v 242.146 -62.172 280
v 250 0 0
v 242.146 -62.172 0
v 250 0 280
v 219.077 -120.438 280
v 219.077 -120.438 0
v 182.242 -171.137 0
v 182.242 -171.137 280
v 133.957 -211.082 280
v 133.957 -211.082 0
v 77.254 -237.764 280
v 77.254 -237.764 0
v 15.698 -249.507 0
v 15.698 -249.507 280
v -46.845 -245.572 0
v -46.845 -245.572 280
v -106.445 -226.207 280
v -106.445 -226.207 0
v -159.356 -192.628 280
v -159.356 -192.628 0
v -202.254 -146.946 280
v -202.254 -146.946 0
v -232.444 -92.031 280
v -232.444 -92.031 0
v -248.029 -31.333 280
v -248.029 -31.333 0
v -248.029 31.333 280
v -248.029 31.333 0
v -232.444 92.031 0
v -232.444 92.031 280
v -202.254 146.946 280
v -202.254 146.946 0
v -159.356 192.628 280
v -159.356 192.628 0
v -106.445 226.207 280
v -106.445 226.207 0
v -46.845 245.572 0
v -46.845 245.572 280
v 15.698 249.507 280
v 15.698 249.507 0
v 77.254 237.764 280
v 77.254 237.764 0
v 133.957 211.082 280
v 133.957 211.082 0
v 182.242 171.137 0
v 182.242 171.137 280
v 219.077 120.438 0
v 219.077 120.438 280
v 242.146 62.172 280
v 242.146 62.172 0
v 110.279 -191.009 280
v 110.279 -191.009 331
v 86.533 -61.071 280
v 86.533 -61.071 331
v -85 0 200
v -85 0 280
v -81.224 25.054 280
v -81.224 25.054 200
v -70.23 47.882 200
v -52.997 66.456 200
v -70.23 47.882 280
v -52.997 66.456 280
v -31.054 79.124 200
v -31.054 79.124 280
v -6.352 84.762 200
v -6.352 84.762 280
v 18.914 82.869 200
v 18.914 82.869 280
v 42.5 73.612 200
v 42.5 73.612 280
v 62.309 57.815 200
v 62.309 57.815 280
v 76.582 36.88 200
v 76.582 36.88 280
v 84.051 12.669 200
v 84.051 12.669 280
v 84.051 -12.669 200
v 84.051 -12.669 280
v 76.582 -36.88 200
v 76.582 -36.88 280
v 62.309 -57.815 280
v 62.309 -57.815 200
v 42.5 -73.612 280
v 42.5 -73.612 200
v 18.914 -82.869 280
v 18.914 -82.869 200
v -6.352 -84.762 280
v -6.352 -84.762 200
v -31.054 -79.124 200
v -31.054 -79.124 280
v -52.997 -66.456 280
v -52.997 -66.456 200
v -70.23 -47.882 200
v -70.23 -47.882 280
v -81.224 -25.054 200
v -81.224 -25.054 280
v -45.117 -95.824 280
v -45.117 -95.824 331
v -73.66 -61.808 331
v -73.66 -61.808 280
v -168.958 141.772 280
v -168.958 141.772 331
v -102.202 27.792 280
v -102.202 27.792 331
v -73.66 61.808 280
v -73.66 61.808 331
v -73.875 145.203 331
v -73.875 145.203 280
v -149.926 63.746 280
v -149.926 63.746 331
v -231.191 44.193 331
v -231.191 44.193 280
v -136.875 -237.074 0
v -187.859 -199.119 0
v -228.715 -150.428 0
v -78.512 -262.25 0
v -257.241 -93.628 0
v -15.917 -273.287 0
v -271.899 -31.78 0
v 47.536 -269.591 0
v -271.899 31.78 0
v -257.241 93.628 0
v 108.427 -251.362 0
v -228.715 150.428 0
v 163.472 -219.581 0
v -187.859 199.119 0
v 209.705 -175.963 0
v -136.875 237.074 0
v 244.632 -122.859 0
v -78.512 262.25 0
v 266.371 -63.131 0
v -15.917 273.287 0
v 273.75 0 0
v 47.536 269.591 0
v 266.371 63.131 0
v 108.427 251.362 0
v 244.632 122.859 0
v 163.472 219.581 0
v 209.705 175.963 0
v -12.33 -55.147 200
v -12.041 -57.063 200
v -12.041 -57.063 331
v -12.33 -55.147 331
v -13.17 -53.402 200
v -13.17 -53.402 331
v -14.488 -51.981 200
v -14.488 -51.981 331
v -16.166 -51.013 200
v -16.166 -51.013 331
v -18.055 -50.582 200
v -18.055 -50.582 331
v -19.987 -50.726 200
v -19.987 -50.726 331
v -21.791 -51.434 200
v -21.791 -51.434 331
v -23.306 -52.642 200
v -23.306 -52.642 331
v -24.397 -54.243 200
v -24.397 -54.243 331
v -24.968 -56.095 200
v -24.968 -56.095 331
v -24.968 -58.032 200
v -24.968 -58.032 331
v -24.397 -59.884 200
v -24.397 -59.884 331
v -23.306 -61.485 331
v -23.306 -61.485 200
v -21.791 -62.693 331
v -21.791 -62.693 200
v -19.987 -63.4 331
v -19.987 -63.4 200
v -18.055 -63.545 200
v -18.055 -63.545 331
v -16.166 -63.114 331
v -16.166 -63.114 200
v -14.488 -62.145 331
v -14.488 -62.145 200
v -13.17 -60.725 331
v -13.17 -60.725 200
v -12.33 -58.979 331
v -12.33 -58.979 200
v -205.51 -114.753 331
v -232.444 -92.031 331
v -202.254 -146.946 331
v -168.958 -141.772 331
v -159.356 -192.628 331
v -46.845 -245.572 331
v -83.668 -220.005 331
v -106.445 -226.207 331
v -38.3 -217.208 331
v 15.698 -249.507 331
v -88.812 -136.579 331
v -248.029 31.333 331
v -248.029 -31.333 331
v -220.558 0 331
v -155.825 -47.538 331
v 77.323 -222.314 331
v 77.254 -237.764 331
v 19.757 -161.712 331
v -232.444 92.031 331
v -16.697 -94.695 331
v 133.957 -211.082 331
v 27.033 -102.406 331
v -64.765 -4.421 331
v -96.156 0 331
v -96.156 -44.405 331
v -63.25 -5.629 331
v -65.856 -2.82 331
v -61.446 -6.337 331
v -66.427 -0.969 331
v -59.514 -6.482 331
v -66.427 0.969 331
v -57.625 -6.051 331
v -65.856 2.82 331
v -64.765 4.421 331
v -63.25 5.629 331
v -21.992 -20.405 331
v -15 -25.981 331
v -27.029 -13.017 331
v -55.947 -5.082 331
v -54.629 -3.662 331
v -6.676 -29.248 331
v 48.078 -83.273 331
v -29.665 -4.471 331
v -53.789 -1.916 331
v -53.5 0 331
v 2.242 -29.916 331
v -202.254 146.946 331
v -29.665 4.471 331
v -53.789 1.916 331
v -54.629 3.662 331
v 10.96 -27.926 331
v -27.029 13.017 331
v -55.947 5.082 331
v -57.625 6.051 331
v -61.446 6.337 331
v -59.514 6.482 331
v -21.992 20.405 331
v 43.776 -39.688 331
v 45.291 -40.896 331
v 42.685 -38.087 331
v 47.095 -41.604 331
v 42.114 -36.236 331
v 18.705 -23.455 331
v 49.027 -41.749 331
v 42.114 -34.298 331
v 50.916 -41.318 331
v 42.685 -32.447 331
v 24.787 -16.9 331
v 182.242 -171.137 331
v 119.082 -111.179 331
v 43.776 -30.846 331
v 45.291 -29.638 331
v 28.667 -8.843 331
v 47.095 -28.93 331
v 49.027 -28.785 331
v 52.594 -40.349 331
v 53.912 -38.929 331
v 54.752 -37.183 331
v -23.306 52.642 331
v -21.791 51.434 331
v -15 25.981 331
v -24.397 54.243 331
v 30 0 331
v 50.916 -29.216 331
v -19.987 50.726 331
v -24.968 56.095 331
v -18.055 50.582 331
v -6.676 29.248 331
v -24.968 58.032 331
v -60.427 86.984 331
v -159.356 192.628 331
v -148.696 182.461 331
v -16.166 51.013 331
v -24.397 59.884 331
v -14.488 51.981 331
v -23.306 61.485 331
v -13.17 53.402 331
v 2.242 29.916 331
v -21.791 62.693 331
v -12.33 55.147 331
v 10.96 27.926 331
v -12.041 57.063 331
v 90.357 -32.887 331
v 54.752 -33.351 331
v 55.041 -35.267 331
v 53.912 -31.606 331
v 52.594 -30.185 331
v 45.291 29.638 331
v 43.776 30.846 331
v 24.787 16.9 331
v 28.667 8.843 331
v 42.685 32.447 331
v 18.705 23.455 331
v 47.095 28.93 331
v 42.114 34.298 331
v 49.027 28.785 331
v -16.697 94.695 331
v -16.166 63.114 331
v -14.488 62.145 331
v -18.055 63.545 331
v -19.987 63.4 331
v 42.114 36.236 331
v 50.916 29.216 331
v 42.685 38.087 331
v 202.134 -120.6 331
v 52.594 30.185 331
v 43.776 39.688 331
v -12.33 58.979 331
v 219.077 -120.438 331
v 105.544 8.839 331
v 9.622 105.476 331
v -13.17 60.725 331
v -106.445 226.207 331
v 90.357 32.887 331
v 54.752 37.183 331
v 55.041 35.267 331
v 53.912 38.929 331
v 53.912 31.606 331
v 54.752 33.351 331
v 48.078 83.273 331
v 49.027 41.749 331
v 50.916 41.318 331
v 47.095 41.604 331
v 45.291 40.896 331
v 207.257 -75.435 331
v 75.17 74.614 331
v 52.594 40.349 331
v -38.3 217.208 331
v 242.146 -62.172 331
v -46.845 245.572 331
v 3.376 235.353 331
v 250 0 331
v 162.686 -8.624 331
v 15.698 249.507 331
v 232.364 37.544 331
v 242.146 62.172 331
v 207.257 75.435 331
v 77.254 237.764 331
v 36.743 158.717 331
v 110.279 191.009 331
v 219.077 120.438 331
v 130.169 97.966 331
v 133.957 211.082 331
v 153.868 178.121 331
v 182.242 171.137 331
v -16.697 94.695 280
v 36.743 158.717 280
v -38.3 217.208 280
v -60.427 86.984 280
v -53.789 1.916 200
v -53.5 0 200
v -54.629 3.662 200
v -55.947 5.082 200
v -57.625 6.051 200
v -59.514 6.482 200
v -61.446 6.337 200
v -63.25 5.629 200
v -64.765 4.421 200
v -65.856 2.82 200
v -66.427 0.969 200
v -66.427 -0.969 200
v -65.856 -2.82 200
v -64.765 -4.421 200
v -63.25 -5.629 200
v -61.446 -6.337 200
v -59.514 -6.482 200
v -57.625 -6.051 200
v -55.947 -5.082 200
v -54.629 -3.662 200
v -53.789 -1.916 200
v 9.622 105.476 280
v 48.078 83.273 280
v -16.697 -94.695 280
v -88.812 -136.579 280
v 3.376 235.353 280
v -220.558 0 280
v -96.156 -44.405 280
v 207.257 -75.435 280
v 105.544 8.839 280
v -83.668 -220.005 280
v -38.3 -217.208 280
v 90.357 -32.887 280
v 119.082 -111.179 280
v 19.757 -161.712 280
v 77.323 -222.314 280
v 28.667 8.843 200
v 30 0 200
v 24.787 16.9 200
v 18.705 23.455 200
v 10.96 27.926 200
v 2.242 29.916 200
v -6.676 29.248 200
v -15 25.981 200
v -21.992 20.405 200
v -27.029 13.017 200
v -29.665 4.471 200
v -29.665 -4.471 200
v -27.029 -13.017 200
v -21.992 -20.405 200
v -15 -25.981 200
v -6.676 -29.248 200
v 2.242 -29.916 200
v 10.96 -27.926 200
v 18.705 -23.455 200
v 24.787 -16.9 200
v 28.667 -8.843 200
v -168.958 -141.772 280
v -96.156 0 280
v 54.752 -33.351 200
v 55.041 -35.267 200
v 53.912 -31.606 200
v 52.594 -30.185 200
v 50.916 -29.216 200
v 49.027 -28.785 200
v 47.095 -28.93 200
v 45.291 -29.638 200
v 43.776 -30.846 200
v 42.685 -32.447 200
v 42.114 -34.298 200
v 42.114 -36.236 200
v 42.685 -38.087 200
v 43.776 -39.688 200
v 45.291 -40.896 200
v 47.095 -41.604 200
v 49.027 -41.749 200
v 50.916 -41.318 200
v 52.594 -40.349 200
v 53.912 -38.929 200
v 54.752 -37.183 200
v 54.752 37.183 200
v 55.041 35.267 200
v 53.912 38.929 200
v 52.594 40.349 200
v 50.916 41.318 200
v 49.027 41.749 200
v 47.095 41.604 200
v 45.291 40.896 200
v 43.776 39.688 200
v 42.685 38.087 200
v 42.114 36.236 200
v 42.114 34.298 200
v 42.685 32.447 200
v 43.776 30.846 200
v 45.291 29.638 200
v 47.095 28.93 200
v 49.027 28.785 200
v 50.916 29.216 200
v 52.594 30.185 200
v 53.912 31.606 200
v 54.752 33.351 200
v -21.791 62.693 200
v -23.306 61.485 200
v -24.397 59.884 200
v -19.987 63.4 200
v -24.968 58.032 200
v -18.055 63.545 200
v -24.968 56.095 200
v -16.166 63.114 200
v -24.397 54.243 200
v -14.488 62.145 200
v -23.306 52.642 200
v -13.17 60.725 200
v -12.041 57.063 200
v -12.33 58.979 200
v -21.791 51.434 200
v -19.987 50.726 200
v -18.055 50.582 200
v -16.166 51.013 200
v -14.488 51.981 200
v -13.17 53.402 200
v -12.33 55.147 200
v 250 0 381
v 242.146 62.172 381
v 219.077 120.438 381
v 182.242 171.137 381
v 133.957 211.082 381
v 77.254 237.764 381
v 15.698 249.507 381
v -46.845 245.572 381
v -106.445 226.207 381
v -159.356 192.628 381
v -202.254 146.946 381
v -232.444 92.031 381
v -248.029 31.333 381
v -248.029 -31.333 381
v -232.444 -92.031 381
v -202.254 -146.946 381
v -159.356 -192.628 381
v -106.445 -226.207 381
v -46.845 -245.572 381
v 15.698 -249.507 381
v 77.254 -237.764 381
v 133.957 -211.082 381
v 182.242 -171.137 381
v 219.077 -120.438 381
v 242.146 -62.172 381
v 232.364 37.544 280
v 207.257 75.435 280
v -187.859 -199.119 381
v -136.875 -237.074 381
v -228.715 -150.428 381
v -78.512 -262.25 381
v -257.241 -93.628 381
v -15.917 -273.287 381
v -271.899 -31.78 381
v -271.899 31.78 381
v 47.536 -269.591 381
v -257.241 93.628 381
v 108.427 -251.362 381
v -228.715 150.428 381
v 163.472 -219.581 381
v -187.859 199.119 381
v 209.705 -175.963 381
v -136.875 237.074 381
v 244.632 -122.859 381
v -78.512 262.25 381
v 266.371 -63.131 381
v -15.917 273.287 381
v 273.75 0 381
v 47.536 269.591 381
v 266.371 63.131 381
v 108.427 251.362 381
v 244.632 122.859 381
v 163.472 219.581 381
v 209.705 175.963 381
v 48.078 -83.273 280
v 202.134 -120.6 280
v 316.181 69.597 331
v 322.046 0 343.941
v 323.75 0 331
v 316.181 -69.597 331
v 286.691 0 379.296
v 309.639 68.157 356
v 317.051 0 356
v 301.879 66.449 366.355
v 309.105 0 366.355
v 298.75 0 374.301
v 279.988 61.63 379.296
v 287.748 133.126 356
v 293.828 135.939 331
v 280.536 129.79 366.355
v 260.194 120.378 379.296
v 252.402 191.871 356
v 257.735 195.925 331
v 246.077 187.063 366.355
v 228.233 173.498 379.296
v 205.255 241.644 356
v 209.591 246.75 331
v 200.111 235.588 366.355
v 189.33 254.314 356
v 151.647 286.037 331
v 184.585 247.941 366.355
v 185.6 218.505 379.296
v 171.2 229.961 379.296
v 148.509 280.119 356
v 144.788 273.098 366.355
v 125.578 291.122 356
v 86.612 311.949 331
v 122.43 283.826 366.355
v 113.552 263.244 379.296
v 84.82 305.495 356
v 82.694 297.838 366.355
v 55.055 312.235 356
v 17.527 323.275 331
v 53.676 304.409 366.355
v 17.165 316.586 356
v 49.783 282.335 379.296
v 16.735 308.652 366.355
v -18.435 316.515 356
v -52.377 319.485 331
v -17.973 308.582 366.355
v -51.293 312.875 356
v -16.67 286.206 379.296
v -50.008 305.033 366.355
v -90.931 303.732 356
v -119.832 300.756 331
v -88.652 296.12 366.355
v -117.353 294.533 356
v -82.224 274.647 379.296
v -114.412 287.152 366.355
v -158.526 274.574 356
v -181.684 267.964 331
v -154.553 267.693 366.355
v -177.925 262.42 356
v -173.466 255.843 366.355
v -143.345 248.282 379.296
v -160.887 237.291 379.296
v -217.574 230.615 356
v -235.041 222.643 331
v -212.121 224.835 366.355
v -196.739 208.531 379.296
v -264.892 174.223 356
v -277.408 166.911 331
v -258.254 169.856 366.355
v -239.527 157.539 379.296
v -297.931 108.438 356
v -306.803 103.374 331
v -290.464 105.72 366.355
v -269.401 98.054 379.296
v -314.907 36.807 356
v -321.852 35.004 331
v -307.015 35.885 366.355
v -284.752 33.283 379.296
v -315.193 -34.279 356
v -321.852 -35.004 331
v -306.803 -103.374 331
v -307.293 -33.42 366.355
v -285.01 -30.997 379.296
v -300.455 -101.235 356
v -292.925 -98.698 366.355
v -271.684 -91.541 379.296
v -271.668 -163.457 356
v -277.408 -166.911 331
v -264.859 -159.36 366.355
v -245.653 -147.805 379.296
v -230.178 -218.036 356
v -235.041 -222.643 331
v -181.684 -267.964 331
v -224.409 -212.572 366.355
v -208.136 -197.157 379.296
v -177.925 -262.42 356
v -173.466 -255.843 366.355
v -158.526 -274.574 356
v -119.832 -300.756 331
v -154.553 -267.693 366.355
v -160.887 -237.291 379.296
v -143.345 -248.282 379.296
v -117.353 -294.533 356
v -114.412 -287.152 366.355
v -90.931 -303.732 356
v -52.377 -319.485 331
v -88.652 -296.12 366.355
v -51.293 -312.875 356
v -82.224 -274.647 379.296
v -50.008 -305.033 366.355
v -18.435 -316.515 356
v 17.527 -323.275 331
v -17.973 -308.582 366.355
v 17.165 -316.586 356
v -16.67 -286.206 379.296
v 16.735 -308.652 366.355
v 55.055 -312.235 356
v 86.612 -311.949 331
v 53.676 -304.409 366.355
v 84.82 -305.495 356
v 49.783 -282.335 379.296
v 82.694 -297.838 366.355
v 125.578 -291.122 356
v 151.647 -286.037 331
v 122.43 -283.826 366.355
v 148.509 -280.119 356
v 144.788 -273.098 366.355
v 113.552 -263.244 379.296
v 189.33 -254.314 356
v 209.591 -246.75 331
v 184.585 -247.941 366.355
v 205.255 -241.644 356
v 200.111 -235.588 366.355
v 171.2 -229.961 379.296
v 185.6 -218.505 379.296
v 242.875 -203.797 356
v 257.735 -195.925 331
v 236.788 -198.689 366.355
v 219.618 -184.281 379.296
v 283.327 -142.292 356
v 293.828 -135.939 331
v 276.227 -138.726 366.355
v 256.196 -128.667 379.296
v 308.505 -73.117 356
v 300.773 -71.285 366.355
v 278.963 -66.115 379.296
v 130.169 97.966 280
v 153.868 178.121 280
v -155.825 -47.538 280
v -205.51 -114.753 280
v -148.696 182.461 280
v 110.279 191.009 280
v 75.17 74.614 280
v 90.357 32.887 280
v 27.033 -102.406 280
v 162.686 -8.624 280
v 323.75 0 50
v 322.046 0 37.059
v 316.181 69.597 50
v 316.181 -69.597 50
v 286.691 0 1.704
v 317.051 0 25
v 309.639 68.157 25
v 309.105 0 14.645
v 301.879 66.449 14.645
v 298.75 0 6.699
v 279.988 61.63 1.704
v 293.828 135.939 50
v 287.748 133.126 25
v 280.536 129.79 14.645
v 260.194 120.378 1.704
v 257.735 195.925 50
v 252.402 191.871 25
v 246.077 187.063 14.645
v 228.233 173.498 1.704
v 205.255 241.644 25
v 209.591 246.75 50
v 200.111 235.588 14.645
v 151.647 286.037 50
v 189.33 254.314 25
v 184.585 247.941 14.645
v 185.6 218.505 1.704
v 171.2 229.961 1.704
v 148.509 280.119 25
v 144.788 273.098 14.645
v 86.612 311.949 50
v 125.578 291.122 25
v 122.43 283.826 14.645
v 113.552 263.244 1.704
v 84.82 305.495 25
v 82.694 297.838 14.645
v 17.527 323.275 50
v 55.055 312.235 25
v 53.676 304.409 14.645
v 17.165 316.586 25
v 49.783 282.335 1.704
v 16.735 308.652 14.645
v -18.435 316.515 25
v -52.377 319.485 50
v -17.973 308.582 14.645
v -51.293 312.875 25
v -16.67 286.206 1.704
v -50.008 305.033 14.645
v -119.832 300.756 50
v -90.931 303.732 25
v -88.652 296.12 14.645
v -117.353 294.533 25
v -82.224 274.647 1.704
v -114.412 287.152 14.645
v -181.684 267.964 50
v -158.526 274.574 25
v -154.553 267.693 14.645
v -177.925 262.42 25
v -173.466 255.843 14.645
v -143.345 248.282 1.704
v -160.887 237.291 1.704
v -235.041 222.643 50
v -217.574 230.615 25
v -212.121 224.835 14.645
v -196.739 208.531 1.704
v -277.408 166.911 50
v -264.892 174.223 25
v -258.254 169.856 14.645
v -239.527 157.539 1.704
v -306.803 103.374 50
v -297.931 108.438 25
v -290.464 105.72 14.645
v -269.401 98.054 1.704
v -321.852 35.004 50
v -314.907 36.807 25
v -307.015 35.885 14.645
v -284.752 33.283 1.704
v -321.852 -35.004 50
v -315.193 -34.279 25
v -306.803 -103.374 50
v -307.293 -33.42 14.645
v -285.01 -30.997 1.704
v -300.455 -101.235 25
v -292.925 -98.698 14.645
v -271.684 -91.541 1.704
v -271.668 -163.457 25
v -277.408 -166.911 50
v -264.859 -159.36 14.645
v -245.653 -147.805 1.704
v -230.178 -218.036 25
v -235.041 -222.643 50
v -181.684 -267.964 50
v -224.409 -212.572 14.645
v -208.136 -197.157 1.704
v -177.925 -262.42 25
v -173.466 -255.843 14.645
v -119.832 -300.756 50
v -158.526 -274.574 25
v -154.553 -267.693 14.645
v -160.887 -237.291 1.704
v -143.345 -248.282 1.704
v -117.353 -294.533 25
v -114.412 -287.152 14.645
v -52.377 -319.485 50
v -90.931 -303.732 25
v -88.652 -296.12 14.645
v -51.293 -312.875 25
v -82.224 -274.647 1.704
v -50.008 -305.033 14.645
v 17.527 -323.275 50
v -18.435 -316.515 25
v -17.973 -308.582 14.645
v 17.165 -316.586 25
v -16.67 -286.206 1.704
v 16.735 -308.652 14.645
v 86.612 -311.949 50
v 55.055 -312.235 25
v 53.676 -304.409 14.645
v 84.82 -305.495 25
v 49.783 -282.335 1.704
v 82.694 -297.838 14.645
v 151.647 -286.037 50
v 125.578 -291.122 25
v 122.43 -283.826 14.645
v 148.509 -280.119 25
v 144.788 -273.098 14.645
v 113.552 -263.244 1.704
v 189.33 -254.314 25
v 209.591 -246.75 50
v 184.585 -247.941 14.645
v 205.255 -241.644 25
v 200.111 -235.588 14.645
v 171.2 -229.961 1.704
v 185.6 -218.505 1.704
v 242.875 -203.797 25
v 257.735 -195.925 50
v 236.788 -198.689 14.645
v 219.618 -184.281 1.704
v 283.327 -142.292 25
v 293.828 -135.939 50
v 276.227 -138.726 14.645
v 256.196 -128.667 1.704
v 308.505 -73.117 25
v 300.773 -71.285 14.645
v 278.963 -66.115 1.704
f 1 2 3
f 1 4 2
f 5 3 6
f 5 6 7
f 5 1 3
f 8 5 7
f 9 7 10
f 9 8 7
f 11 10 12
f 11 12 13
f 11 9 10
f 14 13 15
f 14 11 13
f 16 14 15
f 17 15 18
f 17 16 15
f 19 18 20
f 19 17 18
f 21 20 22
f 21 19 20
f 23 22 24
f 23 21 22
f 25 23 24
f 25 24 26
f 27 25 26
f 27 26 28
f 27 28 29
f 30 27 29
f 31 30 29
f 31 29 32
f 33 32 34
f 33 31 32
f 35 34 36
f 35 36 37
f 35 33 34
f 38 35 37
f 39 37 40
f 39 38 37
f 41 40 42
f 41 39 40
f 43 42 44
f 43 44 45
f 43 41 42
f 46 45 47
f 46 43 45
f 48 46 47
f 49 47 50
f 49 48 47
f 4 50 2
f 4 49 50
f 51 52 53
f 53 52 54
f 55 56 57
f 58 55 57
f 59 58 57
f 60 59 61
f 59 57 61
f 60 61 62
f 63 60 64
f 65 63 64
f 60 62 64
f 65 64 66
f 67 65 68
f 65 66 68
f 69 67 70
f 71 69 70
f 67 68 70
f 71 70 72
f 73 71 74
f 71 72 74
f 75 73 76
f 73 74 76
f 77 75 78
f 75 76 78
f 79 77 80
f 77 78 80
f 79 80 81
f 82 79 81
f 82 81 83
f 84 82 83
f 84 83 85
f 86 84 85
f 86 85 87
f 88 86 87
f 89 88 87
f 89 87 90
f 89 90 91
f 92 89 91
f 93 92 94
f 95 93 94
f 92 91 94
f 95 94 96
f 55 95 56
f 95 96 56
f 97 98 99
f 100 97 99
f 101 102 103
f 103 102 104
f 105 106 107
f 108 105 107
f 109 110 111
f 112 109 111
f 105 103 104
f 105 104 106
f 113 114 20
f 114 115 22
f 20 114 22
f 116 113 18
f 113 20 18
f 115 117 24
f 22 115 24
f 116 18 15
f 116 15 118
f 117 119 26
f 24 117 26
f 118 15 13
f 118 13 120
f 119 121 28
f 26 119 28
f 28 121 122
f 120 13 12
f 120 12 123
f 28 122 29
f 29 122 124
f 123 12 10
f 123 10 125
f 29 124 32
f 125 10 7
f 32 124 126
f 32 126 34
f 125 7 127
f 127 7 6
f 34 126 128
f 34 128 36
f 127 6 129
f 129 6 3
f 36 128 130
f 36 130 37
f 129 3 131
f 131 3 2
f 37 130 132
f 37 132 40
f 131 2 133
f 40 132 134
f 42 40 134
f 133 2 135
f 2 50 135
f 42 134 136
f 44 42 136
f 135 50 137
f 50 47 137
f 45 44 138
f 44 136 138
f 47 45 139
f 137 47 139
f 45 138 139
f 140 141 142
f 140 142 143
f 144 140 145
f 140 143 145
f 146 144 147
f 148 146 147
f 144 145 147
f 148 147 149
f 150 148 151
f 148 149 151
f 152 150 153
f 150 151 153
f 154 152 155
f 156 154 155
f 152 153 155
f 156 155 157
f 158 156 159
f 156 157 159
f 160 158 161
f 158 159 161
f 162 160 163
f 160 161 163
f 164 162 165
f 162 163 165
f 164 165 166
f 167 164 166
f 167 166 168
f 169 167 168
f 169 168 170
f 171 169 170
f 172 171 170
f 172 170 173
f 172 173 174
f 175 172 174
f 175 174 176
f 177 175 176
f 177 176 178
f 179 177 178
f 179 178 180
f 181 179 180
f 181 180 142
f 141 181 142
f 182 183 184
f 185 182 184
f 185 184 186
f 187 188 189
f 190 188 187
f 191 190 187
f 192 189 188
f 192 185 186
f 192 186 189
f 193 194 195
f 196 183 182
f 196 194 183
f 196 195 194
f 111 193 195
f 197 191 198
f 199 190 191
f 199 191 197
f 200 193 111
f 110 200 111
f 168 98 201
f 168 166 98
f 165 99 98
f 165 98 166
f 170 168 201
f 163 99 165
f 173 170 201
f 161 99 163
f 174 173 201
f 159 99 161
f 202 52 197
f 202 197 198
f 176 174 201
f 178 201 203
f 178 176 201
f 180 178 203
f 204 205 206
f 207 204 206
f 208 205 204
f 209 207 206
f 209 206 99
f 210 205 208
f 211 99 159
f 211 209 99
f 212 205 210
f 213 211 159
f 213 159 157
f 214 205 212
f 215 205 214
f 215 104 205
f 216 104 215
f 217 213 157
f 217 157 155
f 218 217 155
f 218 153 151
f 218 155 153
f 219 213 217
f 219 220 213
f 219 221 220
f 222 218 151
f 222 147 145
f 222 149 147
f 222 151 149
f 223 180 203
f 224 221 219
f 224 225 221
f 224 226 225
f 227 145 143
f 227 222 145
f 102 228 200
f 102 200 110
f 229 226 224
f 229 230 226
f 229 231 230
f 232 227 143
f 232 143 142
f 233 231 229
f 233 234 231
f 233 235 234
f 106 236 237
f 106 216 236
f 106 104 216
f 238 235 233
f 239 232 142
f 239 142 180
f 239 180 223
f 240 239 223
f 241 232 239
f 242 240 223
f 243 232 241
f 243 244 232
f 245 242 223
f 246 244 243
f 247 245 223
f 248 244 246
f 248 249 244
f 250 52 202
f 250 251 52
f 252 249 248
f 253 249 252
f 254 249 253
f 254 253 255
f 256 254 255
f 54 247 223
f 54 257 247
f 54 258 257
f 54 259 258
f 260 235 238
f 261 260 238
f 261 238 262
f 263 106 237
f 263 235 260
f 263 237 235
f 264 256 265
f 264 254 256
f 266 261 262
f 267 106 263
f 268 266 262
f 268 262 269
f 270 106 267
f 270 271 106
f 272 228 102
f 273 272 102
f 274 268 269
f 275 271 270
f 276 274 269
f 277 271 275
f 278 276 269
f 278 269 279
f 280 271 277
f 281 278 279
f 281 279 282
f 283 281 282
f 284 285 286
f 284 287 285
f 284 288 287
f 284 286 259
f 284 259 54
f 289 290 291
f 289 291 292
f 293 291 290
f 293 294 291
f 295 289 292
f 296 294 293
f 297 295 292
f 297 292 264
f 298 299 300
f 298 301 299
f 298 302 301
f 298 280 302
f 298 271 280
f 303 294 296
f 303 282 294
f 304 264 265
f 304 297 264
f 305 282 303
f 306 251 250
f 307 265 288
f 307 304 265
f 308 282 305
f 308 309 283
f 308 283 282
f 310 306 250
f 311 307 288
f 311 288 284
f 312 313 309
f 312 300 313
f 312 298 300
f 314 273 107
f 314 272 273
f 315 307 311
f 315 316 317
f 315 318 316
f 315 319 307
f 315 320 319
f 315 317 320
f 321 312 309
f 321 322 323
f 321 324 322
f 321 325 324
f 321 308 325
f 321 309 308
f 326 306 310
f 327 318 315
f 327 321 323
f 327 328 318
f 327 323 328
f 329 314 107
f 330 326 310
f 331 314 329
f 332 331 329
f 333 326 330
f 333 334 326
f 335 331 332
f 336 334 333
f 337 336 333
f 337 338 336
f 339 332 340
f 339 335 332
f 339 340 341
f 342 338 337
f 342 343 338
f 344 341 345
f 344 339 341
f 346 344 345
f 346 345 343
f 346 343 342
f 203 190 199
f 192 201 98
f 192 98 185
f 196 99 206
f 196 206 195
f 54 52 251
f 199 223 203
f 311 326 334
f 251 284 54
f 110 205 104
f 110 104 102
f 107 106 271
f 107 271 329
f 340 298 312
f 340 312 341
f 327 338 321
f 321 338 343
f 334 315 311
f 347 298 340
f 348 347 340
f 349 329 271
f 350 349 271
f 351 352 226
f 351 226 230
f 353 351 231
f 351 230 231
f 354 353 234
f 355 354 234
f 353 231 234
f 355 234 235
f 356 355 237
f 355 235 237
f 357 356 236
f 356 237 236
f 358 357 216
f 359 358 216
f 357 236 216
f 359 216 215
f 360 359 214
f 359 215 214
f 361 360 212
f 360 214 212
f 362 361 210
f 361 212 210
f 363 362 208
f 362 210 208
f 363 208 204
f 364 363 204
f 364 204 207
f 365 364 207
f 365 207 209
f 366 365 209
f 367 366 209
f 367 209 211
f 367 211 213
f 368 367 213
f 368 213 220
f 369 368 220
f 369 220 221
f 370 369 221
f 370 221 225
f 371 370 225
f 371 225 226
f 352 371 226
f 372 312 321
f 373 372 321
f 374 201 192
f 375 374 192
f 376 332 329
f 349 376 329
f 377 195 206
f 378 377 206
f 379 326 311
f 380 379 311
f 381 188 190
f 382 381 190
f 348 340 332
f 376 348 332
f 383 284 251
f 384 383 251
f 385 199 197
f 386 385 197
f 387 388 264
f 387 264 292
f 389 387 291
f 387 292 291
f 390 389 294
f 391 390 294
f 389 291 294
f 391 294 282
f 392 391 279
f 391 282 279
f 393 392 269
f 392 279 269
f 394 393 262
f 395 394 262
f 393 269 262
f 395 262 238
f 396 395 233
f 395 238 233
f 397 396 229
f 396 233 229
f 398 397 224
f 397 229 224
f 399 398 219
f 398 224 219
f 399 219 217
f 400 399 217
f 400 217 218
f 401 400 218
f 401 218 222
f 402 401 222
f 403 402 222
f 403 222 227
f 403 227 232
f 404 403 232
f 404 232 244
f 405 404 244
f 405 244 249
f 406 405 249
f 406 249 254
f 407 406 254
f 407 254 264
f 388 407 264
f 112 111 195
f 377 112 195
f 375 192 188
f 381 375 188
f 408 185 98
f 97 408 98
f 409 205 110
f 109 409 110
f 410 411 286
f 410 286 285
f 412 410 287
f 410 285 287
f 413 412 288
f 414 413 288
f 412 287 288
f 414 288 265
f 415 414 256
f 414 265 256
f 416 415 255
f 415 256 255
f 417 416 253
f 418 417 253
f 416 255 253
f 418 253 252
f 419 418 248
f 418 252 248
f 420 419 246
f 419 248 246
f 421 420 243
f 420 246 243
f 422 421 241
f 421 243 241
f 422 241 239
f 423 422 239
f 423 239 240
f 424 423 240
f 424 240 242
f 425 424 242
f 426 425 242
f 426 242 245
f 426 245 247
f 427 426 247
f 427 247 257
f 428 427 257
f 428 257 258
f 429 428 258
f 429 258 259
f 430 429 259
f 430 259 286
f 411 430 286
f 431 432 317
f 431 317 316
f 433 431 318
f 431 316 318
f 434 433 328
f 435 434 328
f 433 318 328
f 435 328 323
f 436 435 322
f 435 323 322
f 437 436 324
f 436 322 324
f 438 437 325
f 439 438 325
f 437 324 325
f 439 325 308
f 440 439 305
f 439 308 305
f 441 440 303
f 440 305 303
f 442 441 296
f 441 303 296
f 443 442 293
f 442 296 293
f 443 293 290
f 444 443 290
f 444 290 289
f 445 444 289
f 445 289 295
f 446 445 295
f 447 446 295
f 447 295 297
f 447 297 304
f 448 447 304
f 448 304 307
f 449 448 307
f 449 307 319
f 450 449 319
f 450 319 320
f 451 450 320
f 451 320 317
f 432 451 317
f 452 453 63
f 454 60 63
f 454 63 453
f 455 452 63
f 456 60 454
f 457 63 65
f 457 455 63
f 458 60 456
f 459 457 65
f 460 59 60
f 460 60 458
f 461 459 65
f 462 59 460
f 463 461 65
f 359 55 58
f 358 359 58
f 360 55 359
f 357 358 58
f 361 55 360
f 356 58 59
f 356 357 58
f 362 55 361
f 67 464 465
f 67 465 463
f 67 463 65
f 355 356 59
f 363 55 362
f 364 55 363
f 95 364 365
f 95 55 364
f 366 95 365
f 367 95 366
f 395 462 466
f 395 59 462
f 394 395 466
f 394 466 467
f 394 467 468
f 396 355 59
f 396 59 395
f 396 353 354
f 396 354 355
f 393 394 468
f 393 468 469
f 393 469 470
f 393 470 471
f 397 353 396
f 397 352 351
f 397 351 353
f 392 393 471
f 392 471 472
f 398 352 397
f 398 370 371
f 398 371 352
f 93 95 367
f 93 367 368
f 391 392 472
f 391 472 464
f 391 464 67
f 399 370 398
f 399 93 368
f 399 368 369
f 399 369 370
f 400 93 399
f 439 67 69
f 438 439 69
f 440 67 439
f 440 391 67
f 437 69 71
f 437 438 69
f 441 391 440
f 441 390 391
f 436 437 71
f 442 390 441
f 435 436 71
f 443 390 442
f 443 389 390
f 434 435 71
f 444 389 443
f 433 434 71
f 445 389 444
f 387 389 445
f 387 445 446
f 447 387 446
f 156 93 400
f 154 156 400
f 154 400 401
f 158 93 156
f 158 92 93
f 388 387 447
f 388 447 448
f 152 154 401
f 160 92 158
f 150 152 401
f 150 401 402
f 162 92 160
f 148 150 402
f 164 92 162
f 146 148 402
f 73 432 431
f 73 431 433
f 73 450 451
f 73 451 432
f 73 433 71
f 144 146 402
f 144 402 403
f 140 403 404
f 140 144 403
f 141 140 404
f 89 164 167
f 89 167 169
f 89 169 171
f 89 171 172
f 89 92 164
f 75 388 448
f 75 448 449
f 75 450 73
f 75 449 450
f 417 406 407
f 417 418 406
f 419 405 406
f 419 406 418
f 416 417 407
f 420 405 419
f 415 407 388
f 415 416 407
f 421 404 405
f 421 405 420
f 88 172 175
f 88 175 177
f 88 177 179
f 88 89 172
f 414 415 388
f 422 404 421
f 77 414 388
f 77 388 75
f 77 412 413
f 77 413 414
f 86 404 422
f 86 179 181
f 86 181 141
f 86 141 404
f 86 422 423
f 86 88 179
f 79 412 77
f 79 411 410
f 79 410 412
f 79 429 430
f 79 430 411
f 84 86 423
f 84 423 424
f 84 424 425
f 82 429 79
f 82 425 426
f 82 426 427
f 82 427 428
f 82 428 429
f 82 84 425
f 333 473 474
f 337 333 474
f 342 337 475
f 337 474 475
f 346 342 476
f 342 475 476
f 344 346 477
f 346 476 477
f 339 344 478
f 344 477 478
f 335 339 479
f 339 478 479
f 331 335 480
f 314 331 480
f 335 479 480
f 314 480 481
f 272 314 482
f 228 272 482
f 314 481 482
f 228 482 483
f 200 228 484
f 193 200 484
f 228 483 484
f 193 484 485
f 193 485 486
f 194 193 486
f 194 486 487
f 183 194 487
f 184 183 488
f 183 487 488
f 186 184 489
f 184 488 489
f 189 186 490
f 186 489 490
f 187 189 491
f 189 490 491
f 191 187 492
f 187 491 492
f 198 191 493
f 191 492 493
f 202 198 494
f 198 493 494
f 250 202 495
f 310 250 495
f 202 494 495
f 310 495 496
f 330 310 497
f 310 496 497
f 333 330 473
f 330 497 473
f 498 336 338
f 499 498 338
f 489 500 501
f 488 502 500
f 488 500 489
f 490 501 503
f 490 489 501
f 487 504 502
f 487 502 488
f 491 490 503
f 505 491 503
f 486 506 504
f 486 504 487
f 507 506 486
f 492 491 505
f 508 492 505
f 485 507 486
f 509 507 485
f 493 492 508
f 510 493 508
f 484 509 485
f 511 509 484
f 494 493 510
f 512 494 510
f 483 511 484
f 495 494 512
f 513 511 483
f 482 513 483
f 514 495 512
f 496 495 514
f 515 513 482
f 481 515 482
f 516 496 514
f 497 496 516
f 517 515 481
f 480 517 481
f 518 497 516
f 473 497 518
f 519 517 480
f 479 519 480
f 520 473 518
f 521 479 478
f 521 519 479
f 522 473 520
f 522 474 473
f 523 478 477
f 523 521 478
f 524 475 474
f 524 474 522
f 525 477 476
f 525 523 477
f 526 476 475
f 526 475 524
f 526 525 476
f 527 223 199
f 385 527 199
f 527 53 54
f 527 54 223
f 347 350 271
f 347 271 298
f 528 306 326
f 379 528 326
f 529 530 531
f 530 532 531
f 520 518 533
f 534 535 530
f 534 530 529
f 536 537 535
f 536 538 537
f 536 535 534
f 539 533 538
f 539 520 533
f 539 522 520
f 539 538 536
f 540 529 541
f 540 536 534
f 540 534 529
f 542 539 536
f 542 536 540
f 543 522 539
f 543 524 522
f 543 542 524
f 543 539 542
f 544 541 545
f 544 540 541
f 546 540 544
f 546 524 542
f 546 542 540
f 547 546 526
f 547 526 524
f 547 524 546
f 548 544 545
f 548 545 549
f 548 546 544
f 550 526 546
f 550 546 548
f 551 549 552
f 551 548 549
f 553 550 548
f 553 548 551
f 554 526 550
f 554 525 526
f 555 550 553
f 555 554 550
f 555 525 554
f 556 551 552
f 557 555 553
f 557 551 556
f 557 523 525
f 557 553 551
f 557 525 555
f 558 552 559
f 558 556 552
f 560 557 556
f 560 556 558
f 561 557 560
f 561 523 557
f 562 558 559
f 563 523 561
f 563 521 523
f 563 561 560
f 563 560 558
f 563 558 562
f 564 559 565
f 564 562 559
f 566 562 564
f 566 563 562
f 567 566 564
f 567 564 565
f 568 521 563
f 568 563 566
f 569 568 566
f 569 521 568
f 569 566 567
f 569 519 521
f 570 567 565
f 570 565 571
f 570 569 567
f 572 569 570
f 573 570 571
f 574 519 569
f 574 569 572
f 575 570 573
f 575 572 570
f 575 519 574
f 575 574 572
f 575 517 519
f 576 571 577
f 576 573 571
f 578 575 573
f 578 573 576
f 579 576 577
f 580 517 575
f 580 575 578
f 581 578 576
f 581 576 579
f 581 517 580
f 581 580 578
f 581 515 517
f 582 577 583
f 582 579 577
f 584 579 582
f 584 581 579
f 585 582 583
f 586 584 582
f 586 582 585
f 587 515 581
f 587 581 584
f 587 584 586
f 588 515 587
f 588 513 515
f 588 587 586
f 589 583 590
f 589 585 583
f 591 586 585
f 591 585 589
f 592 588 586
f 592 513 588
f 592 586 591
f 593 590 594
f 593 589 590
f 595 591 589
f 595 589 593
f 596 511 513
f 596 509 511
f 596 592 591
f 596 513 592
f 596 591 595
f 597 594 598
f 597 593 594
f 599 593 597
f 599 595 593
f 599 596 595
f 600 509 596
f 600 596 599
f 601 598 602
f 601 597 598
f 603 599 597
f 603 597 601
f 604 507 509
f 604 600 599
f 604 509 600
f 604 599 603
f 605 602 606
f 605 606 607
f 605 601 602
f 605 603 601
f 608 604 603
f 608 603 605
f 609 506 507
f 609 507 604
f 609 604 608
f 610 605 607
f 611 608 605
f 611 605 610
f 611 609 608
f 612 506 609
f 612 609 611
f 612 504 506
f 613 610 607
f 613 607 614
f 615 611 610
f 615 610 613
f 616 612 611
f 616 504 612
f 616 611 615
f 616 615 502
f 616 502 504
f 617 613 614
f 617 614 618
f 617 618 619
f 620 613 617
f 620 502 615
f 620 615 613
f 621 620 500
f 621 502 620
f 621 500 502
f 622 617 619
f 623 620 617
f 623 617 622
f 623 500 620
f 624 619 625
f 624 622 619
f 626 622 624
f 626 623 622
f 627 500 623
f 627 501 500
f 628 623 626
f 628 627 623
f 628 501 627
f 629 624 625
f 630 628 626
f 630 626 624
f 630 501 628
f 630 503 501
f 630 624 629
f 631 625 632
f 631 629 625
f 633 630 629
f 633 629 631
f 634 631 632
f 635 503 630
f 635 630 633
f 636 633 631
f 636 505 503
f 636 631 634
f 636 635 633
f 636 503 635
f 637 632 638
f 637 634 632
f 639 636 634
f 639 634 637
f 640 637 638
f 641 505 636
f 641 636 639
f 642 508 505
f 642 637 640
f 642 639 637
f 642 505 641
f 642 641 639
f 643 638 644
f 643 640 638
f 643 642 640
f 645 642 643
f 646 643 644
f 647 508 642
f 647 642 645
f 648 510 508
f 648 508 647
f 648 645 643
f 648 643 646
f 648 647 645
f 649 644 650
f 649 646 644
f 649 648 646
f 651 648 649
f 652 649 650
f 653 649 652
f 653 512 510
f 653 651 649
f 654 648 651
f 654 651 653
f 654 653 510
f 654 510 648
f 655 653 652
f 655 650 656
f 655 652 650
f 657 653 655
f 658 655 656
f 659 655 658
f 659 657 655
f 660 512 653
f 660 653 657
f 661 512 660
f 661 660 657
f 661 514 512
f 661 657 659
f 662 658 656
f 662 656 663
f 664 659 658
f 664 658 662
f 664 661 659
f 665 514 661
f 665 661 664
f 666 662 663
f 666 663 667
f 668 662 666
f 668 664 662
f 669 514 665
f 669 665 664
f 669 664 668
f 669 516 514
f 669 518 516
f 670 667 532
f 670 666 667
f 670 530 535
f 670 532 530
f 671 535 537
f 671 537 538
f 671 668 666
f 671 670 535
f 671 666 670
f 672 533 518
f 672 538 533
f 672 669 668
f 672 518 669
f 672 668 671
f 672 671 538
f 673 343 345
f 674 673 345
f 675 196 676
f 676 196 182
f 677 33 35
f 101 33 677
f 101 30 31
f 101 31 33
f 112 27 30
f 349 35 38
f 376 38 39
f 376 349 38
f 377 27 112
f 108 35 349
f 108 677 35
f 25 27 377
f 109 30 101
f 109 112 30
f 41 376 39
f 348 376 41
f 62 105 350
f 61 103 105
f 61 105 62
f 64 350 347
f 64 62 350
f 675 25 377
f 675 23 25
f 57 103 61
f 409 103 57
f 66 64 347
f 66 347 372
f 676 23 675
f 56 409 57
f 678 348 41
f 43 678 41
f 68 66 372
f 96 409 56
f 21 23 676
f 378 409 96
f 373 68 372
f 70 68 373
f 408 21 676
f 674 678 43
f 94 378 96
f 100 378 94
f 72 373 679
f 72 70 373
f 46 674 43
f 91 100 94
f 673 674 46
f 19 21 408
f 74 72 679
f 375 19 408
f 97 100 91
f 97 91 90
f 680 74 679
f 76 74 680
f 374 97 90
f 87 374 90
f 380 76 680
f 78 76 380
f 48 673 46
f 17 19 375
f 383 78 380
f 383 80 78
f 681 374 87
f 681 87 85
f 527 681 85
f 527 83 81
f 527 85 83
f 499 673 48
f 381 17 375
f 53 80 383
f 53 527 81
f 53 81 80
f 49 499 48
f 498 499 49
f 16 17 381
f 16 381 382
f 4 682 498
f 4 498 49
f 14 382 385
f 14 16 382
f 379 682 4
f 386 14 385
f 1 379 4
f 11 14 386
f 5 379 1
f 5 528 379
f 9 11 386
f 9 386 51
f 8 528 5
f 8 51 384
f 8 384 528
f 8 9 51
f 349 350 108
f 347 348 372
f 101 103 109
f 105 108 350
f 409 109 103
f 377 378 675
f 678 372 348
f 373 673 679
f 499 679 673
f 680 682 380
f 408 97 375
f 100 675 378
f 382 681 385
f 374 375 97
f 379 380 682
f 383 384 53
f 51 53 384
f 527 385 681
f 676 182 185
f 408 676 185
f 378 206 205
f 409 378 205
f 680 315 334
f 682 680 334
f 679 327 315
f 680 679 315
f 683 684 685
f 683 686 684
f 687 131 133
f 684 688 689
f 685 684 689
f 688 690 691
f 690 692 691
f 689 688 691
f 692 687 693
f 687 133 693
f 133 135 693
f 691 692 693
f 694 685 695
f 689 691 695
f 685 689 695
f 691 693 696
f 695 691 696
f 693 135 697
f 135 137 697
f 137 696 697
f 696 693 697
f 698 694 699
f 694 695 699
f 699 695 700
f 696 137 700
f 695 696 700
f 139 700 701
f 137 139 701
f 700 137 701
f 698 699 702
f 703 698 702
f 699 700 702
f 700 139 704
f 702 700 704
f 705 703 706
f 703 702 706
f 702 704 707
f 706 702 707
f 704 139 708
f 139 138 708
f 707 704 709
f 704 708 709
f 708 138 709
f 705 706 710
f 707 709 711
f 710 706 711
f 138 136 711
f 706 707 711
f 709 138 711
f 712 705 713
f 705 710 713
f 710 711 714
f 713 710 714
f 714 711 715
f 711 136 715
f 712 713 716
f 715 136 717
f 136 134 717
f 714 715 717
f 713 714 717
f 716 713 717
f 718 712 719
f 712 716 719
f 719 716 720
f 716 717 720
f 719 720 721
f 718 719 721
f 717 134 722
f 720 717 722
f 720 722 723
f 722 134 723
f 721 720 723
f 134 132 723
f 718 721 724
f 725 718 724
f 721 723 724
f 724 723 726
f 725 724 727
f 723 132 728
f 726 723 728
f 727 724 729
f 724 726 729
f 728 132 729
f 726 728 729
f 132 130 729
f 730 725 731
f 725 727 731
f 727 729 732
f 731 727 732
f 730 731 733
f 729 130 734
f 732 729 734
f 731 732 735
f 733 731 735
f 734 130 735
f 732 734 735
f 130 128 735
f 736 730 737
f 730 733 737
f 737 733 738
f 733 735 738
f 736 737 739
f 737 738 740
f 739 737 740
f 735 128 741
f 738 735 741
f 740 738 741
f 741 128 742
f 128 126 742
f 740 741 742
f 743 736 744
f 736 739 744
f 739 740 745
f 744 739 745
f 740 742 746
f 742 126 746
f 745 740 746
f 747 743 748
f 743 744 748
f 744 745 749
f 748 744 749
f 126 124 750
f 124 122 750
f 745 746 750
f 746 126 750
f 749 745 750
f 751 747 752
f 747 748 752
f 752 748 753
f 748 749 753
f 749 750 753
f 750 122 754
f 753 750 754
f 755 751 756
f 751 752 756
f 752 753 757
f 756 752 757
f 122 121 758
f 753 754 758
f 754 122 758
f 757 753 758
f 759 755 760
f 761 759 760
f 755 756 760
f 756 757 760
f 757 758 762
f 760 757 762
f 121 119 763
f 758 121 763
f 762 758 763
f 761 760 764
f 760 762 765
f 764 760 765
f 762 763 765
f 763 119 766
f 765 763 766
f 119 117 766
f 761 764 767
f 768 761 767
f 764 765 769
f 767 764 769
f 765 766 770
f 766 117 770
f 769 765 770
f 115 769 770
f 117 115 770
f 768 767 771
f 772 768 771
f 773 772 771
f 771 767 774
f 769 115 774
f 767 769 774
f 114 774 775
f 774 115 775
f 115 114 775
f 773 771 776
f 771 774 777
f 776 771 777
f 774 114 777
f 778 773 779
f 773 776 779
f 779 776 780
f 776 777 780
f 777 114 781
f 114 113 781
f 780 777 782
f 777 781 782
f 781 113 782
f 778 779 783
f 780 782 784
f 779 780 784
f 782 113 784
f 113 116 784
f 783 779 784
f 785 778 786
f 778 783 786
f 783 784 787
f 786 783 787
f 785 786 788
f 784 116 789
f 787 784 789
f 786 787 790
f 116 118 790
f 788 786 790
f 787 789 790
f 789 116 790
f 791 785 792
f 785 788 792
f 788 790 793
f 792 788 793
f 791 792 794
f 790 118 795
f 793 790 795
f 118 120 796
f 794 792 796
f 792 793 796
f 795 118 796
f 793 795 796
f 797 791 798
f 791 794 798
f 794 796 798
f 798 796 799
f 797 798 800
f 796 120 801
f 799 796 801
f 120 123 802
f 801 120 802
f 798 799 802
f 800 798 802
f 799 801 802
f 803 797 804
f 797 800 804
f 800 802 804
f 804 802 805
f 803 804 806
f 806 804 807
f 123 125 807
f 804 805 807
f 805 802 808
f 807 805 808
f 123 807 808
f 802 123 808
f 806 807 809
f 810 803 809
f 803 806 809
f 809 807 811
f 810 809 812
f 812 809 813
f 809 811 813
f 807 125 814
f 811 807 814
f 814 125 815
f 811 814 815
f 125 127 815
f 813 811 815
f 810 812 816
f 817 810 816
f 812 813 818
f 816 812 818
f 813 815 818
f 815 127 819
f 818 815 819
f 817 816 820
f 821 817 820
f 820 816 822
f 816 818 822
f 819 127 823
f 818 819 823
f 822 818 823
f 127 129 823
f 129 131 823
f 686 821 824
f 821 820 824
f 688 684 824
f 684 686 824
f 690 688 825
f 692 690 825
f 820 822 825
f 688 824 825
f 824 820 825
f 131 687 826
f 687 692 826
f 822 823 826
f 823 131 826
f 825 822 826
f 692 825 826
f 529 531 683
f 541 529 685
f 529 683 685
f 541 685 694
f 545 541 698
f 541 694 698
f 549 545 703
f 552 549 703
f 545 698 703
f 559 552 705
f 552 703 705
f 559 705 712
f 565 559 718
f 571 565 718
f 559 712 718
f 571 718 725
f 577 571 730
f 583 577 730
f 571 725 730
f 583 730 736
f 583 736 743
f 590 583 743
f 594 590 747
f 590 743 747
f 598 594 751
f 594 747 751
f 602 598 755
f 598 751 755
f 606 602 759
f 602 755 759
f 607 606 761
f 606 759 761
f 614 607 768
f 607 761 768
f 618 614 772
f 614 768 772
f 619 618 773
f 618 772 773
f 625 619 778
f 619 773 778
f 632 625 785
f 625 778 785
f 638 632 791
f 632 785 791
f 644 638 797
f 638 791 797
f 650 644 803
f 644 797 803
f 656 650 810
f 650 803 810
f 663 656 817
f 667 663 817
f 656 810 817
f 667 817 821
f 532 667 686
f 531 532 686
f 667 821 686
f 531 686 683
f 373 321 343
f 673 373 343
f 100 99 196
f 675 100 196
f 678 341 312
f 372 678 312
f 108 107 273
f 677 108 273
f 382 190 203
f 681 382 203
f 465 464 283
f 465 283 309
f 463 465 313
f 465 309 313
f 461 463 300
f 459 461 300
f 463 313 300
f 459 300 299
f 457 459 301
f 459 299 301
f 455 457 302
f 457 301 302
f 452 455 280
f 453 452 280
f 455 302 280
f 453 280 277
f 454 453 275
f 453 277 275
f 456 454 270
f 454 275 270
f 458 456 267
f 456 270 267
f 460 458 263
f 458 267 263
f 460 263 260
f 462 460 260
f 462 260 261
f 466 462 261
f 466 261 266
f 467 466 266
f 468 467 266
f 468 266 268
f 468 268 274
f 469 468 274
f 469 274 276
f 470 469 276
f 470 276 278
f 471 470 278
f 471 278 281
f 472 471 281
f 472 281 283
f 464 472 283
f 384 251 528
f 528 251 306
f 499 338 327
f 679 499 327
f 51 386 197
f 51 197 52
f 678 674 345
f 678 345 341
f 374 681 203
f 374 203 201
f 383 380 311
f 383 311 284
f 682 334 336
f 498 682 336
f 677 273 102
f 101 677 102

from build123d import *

# Parameters (mm, degrees)
SZKIC1_R                    = 323.75
DODANIE_WYCI_GNI_CIE1_DEPTH = 381
ZAOKR_GLENIE1_R             = 50
SZKIC2_R                    = 6.5
SZKIC2_R_2                  = 30
WYTNIJ_WYCI_GNI_CIE1_DEPTH  = 596.641775734
SZKIC3_R                    = 250
WYTNIJ_WYCI_GNI_CIE2_DEPTH  = 50
WYTNIJ_WYCI_GNI_CIE3_START  = -200
SZKIC4_R                    = 250
WYTNIJ_WYCI_GNI_CIE3_DEPTH  = 200
WYTNIJ_WYCI_GNI_CIE4_DEPTH  = 200
WYTNIJ_WYCI_GNI_CIE5_START  = -80
SZKIC6_R                    = 250
SZKIC6_R_2                  = 85
WYTNIJ_WYCI_GNI_CIE5_DEPTH  = 80


with BuildPart() as part:
    # Szkic1 → Dodanie-wyciągnięcie1 (new body)
    with BuildSketch(Plane.XY):
        Circle(SZKIC1_R)
    extrude(amount=DODANIE_WYCI_GNI_CIE1_DEPTH)

    # Zaokrąglenie1
    zaokr_glenie1_edges = [part.edges().sort_by_distance(p)[0] for p in [
        (-323.75, 0, 0),
        (-323.75, 0, 381),
    ]]
    fillet(zaokr_glenie1_edges, radius=ZAOKR_GLENIE1_R)

    # Szkic2 → Wytnij-wyciągnięcie1 (cut, through all)
    with BuildSketch(Plane.XY.offset(381)):
        with Locations((-60, 0)):
            Circle(SZKIC2_R)
        with Locations((-18.541019662, 57.063390978)):
            Circle(SZKIC2_R)
        with Locations((48.541019662, 35.267115138)):
            Circle(SZKIC2_R)
        with Locations((48.541019662, -35.267115138)):
            Circle(SZKIC2_R)
        with Locations((-18.541019662, -57.063390978)):
            Circle(SZKIC2_R)
        Circle(SZKIC2_R_2)
    extrude(amount=-WYTNIJ_WYCI_GNI_CIE1_DEPTH, mode=Mode.SUBTRACT)

    # Szkic3 → Wytnij-wyciągnięcie2 (cut)
    with BuildSketch(Plane.XY.offset(381)):
        Circle(SZKIC3_R)
    extrude(amount=-WYTNIJ_WYCI_GNI_CIE2_DEPTH, mode=Mode.SUBTRACT)

    # Szkic4 → Wytnij-wyciągnięcie3 (cut)
    with BuildSketch(Plane(origin=(0, 0, 0), x_dir=(-1, 0, 0), z_dir=(0, 0, -1)).offset(WYTNIJ_WYCI_GNI_CIE3_START)):
        with Locations(Location((0, 0, 0), (0, 0, 180))):
            Circle(SZKIC4_R)
    extrude(amount=WYTNIJ_WYCI_GNI_CIE3_DEPTH, mode=Mode.SUBTRACT)

    # Szkic5 → Wytnij-wyciągnięcie4 (cut)
    with BuildSketch(Plane.XY.offset(331)):
        Polygon((-96.155840105, 0), (-149.925673453, 63.746040452), (-231.191444309, 44.19337378), (-220.558452121, 0), (-96.155840105, -44.404647078), align=None)
        Polygon((-102.20240394, 27.791849476), (-73.659646986, 61.807782618), (-73.87456406, 145.202665329), (-148.695968113, 182.461084274), (-168.95757663, 141.772240235), align=None)
        Polygon((-60.427327118, 86.984230788), (-16.697286406, 94.695016833), (36.743274881, 158.71734935), (3.376004134, 235.353225607), (-38.29957328, 217.207673641), align=None)
        Polygon((9.622367637, 105.475723792), (48.077920052, 83.273400253), (130.168527149, 97.966421664), (153.868306527, 178.120977019), (110.279226061, 191.009222556), align=None)
        Polygon((75.169649634, 74.613953402), (90.356933392, 32.887234214), (162.686478902, -8.624083495), (232.36391824, 37.543943689), (207.25714991, 75.435433406), align=None)
        Polygon((105.54421715, 8.839484973), (90.356933392, -32.887234214), (119.081619118, -111.17928414), (202.133870171, -120.600318147), (207.25714991, -75.435433406), align=None)
        Polygon((86.533472468, -61.071076714), (48.077920052, -83.273400253), (19.757146304, -161.712462116), (77.323137782, -222.314350799), (110.279226061, -191.009222556), align=None)
        Polygon((27.032754306, -102.405802878), (-16.697286406, -94.695016833), (-88.811914842, -136.578581834), (-83.667950127, -220.005027963), (-38.29957328, -217.207673641), align=None)
        Polygon((-45.116890032, -95.823715761), (-73.659646986, -61.807782618), (-155.824893999, -47.53806521), (-205.509874305, -114.75290746), (-168.95757663, -141.772240235), align=None)
    extrude(amount=-WYTNIJ_WYCI_GNI_CIE4_DEPTH, mode=Mode.SUBTRACT)

    # Szkic6 → Wytnij-wyciągnięcie5 (cut)
    with BuildSketch(Plane(origin=(0, 0, 200), x_dir=(-1, 0, 0), z_dir=(0, 0, -1)).offset(WYTNIJ_WYCI_GNI_CIE5_START)):
        with Locations(Location((0, 0, 0), (0, 0, 180))):
            Circle(SZKIC6_R)
        Circle(SZKIC6_R_2, mode=Mode.SUBTRACT)
    extrude(amount=WYTNIJ_WYCI_GNI_CIE5_DEPTH, mode=Mode.SUBTRACT)


solid = part.part
